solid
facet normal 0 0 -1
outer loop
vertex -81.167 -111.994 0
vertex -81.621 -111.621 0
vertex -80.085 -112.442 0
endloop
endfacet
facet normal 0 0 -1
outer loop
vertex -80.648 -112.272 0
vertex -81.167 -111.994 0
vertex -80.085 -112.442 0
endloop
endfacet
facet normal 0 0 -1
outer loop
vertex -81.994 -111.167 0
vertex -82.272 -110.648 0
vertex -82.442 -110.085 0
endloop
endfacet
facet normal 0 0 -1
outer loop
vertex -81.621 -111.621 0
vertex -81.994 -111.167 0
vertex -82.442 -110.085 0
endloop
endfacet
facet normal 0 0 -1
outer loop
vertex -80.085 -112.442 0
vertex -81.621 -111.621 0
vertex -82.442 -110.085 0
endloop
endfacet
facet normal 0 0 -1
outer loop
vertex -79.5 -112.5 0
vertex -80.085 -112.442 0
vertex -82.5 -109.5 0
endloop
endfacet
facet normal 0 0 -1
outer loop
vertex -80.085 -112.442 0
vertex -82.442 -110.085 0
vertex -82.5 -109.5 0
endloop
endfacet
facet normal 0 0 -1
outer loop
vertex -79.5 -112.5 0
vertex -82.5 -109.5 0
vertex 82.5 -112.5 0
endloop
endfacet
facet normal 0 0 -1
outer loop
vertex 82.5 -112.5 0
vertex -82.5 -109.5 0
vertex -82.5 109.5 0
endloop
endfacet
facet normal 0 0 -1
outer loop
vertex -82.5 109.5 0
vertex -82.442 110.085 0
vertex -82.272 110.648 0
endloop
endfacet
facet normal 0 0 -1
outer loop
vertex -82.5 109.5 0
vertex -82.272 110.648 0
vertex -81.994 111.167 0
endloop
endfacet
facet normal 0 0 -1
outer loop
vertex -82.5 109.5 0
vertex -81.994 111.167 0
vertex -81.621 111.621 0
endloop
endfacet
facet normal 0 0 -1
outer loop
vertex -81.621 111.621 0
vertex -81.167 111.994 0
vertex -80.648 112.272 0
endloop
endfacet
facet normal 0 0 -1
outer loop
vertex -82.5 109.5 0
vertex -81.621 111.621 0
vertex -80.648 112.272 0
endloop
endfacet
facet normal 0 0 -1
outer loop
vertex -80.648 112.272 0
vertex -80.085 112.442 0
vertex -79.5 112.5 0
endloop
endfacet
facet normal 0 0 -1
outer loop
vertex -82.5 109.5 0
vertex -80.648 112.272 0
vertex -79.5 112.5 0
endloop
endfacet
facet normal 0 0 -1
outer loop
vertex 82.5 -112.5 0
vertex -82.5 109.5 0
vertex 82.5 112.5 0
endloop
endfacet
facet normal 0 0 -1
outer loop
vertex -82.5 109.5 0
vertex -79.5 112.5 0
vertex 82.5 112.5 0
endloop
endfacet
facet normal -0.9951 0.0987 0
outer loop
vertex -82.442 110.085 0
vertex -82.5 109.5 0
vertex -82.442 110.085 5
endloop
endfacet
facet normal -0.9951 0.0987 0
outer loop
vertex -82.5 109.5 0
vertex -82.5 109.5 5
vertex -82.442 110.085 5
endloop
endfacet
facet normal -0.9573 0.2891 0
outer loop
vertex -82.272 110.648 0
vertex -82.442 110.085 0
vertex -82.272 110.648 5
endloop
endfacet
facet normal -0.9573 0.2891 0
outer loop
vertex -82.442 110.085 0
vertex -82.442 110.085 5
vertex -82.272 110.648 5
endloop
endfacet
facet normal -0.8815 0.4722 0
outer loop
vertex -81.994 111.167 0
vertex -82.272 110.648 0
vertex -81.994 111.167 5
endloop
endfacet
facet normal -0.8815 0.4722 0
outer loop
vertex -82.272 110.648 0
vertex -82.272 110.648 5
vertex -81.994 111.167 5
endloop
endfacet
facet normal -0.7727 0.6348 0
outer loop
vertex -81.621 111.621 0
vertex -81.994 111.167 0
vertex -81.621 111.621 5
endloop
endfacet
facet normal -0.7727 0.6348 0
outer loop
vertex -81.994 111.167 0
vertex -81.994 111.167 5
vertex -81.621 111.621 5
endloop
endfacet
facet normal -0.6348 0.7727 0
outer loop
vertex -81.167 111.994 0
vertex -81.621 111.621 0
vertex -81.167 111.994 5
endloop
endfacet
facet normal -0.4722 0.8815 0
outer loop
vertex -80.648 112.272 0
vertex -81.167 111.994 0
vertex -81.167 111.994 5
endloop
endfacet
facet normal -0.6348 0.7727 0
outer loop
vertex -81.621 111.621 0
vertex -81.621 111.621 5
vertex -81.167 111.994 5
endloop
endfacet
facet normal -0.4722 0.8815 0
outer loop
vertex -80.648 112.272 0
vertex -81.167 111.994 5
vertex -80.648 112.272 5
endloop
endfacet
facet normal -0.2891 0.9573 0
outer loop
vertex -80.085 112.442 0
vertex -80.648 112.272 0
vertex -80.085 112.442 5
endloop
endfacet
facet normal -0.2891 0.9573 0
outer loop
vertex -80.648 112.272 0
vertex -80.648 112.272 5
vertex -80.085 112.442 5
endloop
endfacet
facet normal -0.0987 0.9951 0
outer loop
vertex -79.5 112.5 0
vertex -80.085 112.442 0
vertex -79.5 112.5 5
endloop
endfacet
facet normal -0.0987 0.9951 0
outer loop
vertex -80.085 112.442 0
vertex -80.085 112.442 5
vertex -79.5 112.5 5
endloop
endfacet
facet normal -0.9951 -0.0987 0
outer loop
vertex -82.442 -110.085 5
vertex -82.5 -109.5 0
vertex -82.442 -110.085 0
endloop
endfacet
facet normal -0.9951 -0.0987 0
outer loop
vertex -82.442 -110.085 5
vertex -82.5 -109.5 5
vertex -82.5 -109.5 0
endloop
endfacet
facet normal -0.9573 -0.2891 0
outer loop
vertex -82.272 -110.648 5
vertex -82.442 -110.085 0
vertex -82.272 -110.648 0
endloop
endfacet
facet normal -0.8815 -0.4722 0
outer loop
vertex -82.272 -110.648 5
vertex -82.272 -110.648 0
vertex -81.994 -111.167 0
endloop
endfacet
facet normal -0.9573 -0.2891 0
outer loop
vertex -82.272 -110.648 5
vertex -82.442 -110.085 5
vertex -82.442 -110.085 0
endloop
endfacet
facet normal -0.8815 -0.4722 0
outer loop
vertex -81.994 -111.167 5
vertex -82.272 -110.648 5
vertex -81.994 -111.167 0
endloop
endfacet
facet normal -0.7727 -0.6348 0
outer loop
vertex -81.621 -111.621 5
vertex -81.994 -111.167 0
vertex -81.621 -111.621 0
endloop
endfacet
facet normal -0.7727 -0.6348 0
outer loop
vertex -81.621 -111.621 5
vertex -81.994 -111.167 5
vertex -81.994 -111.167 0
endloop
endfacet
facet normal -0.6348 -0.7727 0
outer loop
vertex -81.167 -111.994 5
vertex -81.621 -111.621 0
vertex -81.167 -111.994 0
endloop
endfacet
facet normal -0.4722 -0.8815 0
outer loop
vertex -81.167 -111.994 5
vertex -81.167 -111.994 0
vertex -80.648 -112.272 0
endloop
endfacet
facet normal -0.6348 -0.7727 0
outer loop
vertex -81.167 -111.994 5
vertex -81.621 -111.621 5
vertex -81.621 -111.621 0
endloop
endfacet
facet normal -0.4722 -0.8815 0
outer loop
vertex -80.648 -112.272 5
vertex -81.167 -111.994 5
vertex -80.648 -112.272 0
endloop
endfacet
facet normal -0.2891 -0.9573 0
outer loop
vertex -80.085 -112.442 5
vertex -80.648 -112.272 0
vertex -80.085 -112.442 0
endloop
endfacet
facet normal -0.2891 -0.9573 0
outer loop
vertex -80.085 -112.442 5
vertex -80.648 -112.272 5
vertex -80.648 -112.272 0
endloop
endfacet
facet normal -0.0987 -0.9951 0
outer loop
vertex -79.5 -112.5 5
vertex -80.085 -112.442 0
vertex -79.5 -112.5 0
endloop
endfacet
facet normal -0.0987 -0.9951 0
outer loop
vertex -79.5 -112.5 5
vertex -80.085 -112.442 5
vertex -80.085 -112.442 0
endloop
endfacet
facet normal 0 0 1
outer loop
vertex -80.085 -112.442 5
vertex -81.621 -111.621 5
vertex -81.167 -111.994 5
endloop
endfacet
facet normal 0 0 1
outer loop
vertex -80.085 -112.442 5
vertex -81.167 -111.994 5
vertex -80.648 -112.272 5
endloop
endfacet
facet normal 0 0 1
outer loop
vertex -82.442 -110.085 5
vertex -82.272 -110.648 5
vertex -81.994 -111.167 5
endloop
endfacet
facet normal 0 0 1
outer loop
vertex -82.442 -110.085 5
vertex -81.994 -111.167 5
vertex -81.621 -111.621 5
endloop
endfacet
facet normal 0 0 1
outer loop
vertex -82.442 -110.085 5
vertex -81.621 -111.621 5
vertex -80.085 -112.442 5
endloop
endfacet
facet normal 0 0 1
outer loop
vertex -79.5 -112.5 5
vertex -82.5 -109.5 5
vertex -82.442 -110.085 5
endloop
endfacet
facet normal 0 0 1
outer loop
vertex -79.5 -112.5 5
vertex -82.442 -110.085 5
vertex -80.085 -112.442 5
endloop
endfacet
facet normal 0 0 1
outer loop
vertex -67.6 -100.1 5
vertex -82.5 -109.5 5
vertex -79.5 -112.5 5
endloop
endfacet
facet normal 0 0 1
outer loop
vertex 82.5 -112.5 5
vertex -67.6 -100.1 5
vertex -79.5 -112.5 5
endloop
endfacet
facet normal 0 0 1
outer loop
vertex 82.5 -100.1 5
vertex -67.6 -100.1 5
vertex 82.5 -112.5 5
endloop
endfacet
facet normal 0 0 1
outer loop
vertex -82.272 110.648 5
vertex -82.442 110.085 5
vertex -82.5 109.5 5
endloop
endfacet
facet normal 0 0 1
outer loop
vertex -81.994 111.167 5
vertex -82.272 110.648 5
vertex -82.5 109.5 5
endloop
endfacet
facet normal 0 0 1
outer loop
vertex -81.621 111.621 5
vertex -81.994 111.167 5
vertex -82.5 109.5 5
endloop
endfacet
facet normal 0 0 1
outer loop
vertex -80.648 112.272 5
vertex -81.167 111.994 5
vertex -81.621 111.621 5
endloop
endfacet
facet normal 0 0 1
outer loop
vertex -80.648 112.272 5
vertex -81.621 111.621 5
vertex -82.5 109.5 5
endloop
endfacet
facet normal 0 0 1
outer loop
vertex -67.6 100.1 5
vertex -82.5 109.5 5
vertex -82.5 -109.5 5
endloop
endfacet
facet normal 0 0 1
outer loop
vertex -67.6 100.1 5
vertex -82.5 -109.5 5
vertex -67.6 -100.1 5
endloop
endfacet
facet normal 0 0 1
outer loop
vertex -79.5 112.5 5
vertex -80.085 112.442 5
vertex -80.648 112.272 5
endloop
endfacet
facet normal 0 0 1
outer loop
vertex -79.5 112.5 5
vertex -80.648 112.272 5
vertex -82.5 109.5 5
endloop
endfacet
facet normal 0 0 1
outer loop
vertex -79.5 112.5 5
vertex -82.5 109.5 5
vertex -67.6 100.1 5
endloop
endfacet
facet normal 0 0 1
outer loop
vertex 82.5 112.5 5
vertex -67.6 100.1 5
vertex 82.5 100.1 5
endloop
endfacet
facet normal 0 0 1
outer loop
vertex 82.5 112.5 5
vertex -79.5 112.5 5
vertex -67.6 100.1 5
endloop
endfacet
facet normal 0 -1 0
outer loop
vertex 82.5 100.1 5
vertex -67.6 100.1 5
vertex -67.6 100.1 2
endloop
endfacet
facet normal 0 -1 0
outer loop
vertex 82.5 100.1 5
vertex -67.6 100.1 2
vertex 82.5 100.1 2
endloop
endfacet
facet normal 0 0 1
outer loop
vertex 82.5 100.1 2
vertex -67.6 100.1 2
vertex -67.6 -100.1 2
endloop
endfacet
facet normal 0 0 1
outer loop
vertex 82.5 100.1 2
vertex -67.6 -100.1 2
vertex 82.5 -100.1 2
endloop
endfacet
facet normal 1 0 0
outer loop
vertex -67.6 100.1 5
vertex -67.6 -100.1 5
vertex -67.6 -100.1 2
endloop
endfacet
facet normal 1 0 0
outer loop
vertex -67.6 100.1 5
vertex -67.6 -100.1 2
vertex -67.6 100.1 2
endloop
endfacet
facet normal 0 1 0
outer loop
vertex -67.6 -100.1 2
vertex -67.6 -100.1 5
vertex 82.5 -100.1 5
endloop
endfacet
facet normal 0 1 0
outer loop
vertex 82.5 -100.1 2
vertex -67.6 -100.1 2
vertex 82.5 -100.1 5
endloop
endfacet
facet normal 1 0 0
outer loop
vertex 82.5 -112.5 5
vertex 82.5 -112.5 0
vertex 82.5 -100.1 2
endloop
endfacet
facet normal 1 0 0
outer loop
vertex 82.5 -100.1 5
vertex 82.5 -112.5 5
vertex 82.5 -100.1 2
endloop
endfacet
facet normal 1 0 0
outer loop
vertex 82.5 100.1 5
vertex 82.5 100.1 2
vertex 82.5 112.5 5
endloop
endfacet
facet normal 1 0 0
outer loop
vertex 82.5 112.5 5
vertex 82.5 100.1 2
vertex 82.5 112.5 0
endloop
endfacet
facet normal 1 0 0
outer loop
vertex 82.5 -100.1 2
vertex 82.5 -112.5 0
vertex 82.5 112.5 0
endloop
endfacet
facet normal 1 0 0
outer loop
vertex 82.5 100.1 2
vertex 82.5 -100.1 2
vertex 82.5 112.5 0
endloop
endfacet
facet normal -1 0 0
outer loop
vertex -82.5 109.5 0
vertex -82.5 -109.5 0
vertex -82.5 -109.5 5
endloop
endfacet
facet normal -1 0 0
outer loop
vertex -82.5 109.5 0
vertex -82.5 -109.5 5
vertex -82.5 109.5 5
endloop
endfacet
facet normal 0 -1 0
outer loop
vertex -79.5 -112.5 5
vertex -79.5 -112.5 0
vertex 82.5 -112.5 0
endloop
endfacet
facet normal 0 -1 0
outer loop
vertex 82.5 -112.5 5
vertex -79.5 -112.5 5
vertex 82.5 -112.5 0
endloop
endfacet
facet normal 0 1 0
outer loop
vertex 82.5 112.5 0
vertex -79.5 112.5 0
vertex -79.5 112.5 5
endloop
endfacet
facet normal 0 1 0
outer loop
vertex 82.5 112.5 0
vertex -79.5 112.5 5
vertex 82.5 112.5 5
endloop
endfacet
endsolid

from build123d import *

# Parameters (mm, degrees)
SKETCH_W     = 165
SKETCH_H     = 225
PAD_DEPTH    = 5
SKETCH001_W  = 150.1
SKETCH001_H  = 200.2
POCKET_DEPTH = 3
FILLET_R     = 3


with BuildPart() as part:
    # Sketch (on XY_Plane001 of Origin002) → Pad (new body)
    with BuildSketch(Plane.XY):
        Rectangle(SKETCH_W, SKETCH_H)
    extrude(amount=PAD_DEPTH)

    # Sketch001 (on Face6 of Pad) → Pocket (cut)
    with BuildSketch(Plane.XY.offset(5)):
        with Locations((7.45, 0)):
            Rectangle(SKETCH001_W, SKETCH001_H)
    extrude(amount=-POCKET_DEPTH, mode=Mode.SUBTRACT)

    # Fillet
    fillet_edges = [part.edges().sort_by_distance(p)[0] for p in [
        (-82.5, 112.5, 2.5),
        (-82.5, -112.5, 2.5),
    ]]
    fillet(fillet_edges, radius=FILLET_R)


solid = part.part
